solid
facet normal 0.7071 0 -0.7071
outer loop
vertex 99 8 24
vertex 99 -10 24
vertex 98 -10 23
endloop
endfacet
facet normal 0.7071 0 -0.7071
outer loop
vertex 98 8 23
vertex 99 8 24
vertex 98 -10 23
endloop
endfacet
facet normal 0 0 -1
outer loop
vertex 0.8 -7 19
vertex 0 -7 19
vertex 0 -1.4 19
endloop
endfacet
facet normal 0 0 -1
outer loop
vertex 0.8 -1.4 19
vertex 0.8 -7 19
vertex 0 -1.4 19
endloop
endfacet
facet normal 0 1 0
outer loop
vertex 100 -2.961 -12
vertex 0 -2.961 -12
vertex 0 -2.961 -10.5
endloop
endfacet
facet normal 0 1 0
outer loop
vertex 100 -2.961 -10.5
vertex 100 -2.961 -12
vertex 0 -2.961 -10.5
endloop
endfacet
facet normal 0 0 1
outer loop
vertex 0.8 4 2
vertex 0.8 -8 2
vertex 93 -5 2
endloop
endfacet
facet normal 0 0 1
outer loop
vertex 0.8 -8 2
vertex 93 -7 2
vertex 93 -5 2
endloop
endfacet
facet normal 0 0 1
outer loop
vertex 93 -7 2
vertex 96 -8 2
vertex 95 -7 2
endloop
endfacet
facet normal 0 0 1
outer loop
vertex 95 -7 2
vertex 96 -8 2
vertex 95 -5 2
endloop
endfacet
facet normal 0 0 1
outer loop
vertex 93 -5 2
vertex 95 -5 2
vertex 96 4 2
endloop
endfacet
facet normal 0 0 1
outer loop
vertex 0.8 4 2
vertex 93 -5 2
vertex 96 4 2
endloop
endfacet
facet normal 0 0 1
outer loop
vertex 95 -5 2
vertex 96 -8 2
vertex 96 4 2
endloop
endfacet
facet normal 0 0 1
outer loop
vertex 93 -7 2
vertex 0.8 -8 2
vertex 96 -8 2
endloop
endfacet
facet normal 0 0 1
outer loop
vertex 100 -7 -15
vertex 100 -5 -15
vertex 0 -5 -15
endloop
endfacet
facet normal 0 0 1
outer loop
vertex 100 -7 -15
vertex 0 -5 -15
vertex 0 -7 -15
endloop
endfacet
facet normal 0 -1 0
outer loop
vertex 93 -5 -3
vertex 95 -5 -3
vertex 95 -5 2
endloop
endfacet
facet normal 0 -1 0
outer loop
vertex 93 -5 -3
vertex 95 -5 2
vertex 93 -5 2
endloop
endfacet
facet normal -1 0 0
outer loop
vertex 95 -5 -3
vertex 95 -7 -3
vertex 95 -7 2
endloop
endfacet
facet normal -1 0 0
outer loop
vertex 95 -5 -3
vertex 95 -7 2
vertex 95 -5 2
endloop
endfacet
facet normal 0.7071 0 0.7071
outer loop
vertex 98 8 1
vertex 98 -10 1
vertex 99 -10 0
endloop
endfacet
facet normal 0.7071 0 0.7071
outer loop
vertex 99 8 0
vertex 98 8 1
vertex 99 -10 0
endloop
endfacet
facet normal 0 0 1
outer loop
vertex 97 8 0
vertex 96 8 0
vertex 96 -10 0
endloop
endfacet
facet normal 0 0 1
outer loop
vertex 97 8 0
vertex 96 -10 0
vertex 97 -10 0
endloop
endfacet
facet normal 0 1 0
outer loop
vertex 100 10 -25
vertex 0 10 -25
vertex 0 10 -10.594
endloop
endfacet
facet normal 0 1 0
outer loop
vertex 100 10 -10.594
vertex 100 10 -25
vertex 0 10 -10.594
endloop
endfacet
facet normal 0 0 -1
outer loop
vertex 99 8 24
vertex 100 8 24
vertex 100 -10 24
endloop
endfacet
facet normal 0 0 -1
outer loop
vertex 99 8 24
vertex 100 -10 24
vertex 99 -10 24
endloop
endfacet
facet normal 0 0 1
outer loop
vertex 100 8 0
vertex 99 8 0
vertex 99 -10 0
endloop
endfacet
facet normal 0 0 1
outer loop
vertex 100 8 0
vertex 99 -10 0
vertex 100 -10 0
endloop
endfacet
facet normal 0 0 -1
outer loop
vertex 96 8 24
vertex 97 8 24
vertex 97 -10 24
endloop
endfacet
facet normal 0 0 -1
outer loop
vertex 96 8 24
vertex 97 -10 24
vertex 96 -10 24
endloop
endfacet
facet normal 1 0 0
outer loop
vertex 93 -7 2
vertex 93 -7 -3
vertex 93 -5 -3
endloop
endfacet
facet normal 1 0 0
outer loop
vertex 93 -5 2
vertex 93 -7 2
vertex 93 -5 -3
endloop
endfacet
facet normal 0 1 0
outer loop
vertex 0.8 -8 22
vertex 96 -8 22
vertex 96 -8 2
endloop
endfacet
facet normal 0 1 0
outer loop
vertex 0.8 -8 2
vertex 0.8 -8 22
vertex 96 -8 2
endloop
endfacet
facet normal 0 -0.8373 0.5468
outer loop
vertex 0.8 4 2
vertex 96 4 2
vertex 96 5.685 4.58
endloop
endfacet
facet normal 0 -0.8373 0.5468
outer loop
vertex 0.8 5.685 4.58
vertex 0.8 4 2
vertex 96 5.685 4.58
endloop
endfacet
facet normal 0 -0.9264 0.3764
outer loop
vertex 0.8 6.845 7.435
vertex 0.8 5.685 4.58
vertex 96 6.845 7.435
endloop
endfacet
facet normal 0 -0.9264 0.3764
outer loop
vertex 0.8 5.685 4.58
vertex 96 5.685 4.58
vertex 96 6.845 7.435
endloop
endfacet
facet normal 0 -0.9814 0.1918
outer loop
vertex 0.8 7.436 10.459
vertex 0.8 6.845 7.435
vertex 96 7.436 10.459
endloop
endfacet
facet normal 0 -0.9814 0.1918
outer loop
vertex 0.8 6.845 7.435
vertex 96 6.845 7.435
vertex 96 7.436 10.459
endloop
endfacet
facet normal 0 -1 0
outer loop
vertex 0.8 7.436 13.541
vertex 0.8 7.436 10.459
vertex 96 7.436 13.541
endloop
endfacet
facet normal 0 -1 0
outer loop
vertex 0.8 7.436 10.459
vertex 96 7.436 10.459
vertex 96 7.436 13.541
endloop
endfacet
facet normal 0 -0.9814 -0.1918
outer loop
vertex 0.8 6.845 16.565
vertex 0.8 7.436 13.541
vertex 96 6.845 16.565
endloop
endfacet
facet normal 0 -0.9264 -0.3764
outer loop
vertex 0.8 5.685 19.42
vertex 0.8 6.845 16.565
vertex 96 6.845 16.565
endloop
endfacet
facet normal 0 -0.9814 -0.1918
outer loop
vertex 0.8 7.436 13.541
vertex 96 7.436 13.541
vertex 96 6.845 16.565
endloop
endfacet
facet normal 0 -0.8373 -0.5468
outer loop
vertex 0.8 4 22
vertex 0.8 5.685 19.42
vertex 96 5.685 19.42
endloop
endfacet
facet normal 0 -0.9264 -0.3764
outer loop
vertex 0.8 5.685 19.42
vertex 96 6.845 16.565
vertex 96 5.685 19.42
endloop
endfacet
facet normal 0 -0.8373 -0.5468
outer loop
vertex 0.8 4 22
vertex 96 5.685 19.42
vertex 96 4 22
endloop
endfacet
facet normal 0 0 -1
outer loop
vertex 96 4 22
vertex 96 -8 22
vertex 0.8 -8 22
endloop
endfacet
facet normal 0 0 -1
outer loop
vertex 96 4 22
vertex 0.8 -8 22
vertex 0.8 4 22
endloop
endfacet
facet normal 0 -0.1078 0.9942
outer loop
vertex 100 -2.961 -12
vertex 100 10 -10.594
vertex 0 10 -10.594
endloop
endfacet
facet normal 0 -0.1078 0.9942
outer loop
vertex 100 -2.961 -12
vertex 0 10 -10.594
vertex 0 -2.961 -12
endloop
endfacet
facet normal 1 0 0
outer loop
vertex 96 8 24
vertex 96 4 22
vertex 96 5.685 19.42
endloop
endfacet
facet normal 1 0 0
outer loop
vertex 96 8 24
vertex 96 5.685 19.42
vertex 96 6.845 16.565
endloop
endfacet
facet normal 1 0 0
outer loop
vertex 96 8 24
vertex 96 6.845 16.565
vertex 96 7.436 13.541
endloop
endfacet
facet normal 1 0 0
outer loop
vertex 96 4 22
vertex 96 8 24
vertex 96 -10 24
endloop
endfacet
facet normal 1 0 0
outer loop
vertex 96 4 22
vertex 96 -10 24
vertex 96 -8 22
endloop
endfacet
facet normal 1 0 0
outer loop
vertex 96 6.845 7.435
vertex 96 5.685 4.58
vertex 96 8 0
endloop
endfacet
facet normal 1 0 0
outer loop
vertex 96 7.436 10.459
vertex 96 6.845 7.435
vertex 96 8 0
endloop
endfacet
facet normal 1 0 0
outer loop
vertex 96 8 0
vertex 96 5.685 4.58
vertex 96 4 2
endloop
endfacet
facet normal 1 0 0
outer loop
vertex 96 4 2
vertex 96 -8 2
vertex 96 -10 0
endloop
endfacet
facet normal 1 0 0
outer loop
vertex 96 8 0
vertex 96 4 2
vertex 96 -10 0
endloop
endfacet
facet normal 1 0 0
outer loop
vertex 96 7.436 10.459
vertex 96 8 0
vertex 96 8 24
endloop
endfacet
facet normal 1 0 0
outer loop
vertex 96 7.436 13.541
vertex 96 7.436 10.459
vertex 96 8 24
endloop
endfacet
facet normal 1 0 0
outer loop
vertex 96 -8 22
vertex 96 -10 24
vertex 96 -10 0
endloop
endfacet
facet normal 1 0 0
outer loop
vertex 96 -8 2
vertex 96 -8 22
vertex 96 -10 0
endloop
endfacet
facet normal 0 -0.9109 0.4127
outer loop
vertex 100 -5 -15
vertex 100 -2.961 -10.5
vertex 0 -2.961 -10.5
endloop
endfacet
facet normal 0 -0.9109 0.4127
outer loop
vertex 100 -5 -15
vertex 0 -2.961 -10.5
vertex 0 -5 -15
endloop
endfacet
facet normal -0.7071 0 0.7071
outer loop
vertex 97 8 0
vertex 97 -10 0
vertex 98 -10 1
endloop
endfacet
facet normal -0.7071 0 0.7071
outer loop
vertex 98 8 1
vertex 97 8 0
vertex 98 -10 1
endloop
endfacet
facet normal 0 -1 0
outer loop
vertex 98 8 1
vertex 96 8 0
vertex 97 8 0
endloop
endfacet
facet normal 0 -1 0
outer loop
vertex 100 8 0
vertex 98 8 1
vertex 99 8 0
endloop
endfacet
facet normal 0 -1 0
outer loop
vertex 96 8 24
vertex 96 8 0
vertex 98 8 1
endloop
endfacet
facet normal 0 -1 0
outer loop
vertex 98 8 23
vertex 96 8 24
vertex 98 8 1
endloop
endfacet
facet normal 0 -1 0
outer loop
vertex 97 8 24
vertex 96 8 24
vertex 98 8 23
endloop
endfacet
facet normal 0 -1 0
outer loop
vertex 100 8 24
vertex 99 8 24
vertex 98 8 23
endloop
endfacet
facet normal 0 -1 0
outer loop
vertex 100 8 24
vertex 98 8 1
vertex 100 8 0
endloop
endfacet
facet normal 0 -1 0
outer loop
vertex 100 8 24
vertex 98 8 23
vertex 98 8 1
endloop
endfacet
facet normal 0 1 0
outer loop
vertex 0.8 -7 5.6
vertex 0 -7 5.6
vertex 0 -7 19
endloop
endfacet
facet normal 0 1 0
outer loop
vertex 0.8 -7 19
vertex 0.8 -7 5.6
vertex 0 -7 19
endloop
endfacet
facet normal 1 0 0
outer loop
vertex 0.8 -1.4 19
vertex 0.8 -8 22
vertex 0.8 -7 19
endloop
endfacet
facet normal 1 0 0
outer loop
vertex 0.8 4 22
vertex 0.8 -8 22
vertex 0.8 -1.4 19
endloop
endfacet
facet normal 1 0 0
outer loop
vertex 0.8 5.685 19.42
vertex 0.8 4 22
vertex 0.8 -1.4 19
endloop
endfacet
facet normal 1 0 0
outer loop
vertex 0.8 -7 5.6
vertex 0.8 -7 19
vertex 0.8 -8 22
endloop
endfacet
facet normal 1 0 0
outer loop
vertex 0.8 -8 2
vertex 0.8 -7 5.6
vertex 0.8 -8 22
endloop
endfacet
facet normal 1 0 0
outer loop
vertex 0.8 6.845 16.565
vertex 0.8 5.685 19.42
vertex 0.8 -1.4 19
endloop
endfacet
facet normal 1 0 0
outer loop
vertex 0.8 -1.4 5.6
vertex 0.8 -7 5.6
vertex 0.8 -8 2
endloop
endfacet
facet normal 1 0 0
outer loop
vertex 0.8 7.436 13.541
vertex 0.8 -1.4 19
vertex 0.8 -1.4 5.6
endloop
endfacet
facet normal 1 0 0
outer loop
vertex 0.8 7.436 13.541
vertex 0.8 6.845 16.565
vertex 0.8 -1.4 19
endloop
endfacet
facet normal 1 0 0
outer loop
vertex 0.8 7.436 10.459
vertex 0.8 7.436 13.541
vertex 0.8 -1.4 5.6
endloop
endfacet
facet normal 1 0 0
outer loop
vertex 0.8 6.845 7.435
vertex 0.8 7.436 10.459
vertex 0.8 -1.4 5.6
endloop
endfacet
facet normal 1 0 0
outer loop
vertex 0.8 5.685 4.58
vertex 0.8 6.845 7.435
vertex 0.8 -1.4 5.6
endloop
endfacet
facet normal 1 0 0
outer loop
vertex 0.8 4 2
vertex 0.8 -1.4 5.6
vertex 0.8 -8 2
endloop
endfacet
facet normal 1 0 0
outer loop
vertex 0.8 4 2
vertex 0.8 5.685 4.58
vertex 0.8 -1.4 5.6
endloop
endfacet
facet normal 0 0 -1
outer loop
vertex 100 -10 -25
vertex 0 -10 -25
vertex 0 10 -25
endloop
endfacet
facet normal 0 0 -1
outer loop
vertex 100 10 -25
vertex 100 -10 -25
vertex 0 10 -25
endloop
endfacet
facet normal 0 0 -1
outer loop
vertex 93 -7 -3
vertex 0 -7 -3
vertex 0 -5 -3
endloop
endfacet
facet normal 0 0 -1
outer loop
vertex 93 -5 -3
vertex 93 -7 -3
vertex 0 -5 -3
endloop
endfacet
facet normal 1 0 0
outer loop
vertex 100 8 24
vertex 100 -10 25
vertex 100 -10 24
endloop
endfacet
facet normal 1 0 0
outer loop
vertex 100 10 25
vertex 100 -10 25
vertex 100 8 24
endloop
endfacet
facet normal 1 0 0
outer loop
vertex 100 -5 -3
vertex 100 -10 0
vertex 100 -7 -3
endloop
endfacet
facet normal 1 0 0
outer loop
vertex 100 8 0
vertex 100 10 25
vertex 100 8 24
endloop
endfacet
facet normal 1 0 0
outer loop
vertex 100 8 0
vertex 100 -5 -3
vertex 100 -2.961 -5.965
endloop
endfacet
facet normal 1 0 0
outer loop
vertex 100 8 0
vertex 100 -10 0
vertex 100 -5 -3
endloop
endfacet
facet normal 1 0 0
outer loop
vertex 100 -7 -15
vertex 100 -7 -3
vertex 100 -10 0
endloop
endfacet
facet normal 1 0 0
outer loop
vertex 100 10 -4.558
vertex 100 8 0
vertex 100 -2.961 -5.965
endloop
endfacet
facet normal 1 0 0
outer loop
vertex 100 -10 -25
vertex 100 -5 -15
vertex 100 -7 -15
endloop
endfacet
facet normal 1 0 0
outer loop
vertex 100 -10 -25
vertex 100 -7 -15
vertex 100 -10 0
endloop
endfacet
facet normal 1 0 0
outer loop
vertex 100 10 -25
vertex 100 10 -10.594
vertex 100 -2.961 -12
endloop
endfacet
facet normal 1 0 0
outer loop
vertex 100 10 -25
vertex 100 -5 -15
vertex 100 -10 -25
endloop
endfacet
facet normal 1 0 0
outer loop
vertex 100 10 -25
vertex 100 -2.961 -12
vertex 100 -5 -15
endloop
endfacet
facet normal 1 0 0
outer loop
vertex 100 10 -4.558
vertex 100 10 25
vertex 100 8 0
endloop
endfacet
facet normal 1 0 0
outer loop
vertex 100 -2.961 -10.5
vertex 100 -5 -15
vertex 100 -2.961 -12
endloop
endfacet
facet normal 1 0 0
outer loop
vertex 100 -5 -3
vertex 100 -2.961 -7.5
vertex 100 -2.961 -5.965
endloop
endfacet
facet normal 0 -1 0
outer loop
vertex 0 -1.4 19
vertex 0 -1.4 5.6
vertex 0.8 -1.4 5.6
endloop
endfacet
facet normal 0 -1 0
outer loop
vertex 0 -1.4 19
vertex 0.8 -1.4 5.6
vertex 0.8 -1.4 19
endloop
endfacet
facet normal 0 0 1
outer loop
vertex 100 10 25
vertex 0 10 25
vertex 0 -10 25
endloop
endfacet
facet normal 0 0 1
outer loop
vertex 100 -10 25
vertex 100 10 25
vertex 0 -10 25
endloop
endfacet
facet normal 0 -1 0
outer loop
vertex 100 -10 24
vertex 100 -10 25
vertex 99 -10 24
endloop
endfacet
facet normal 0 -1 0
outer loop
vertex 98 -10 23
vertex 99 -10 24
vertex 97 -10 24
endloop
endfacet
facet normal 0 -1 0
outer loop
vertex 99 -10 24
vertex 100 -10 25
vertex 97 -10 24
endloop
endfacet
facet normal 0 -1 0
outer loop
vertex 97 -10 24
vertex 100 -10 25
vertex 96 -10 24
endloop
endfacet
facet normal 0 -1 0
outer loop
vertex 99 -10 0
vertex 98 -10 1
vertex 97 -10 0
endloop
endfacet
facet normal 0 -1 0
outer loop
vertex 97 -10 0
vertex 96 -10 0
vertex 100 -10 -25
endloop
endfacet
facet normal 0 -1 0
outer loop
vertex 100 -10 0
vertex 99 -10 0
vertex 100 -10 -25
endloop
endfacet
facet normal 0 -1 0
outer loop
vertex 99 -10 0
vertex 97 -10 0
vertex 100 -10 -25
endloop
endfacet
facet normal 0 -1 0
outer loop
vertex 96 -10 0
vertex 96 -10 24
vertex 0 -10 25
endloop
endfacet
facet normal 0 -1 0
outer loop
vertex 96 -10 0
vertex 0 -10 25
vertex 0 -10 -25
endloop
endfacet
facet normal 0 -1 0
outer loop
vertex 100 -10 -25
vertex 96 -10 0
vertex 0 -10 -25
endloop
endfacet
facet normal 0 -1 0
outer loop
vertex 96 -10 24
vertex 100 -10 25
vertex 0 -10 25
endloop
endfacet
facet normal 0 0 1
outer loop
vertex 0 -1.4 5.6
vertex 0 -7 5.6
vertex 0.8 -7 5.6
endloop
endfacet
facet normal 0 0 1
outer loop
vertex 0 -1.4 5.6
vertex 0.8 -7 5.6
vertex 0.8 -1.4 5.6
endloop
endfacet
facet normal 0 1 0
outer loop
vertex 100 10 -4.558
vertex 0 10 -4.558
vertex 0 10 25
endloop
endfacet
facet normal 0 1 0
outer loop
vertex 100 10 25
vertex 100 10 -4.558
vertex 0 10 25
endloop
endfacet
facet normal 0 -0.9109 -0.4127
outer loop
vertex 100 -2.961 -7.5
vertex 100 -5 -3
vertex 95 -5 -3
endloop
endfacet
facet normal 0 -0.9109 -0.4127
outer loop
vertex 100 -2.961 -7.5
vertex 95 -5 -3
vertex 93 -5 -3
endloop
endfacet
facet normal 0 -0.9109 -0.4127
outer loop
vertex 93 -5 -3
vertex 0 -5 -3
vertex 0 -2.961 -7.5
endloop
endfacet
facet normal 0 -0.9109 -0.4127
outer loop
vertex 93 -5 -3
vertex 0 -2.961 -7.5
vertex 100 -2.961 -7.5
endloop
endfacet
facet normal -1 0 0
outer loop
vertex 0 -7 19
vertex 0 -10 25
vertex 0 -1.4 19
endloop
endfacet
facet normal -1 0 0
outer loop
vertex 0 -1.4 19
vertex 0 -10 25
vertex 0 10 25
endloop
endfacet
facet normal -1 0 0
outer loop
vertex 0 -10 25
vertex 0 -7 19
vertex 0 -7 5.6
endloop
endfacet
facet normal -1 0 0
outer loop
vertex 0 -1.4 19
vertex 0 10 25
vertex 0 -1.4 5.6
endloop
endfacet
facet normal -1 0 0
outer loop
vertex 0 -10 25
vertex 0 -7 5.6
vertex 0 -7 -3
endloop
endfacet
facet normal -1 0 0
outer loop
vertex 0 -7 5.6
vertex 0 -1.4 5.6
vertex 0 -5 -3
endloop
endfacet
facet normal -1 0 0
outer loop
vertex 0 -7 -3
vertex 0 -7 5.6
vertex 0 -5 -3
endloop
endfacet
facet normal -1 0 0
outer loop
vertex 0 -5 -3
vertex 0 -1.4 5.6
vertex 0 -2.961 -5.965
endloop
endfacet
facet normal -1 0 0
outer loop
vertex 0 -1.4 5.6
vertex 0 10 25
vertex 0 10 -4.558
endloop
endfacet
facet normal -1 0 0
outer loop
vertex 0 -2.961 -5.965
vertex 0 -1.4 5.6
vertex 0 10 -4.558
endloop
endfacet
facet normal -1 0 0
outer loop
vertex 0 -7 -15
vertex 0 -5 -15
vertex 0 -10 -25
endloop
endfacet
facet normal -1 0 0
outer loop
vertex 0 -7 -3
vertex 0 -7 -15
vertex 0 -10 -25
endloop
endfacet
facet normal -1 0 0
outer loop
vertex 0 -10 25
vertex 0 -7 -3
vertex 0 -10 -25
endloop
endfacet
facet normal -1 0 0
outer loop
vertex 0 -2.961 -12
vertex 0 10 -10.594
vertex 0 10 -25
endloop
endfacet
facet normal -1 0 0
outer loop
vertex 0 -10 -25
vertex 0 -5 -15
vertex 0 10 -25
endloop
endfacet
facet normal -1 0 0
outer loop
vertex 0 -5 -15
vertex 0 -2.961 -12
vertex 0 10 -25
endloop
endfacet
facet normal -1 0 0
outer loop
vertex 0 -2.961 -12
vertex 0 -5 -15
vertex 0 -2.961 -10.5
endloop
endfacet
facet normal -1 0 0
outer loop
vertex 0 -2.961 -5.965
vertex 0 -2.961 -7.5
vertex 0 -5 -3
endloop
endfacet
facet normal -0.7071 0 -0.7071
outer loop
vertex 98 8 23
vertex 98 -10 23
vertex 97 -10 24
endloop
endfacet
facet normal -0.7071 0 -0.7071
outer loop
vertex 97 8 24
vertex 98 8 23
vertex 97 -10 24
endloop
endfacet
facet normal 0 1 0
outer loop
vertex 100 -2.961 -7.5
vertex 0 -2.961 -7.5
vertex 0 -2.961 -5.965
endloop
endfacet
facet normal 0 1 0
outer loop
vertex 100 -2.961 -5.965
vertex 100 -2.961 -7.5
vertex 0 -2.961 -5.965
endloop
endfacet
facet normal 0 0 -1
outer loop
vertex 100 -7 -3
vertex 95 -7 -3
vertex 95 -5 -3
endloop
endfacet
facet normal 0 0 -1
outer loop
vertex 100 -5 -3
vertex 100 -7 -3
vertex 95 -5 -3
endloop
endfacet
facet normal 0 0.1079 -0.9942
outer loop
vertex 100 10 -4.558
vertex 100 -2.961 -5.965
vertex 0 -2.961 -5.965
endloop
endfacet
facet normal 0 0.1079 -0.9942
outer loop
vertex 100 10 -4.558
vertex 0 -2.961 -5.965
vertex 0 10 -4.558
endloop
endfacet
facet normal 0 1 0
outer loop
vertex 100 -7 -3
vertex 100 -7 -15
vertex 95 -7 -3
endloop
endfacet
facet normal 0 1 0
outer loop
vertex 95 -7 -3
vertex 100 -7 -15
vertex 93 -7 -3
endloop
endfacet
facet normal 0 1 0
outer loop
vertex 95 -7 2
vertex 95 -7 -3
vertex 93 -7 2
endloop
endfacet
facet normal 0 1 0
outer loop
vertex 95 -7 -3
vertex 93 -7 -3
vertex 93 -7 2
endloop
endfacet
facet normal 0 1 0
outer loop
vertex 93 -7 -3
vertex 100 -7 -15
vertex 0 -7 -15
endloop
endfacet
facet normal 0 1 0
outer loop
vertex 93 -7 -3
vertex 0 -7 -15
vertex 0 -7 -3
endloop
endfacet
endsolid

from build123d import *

# Parameters (mm, degrees)
P_IDAT_VYSUNUT_M2_DEPTH  = 100
ODEBRAT_START            = -1.2
SKICA3_W                 = 20
SKICA3_H                 = 12
ODEBRAT_VYSUNUT_M1_DEPTH = 98
SKICA4_W                 = 13.4
SKICA4_H                 = 5.6
ODEBRAT_VYSUNUT_M2_DEPTH = 95
SKICA5_W                 = 2
SKICA5_H                 = 2
ODEBRAT_VYSUNUT_M3_DEPTH = 9
ODEBRAT_VYSUNUT_M6_DEPTH = 98
ODEBRAT_VYSUNUT_M8_DEPTH = 18


with BuildPart() as part:
    # Skica2 → Přidat vysunutím2 (new body)
    with BuildSketch(Plane(origin=(0, 0, 0), x_dir=(0, 0, -1), z_dir=(1, 0, 0))):
        Polygon((4.558367755, 10), (-25, 10), (-25, -10), (25, -10), (25, 10), (10.59358807, 10), (12, -2.961048892), (10.5, -2.961048892), (15, -5), (15, -7), (3, -7), (3, -5), (7.5, -2.961048892), (5.964779685, -2.961048892), align=None)
    extrude(amount=P_IDAT_VYSUNUT_M2_DEPTH)

    # Skica3 → Odebrat vysunutím1 (cut)
    with BuildSketch(Plane(origin=(100, 0, 0), x_dir=(0, 0, -1), z_dir=(1, 0, 0)).offset(ODEBRAT_START)):
        with Locations((-12, -2)):
            Rectangle(SKICA3_W, SKICA3_H)
    extrude(amount=-ODEBRAT_VYSUNUT_M1_DEPTH, mode=Mode.SUBTRACT)

    # Skica4 → Odebrat vysunutím2 (cut)
    with BuildSketch(Plane.ZY):
        with Locations((12.3, -4.2)):
            Rectangle(SKICA4_W, SKICA4_H)
    extrude(amount=-ODEBRAT_VYSUNUT_M2_DEPTH, mode=Mode.SUBTRACT)

    # Skica5 → Odebrat vysunutím3 (cut)
    with BuildSketch(Plane(origin=(0, 0, -3), x_dir=(-1, 0, 0), z_dir=(0, 0, -1))):
        with Locations((-94, -6)):
            Rectangle(SKICA5_W, SKICA5_H)
    extrude(amount=-ODEBRAT_VYSUNUT_M3_DEPTH, mode=Mode.SUBTRACT)

    # Skica10 → Odebrat vysunutím6 (cut)
    with BuildSketch(Plane(origin=(100, 0, 0), x_dir=(0, 0, -1), z_dir=(1, 0, 0)).offset(ODEBRAT_START)):
        with BuildLine():
            Line((-22, 4), (-2, 4))
            ThreePointArc((-2, 4), (-12, 7.510004003), (-22, 4))
        make_face()
    extrude(amount=-ODEBRAT_VYSUNUT_M6_DEPTH, mode=Mode.SUBTRACT)

    # Skica17 → Odebrat vysunutím8 (cut)
    with BuildSketch(Plane.XZ.offset(10)):
        Polygon((98, 12), (96, 12), (96, 0), (97, 0), (98, 1), align=None)
        Polygon((100, 0), (98, 12), (98, 1), (99, 0), align=None)
        Polygon((100, 12), (98, 12), (100, 0), align=None)
        Polygon((98, 23), (98, 12), (100, 12), (100, 24), (99, 24), align=None)
        Polygon((98, 12), (96, 24), (96, 12), align=None)
        Polygon((97, 24), (96, 24), (98, 12), (98, 23), align=None)
    extrude(amount=-ODEBRAT_VYSUNUT_M8_DEPTH, mode=Mode.SUBTRACT)


solid = part.part
